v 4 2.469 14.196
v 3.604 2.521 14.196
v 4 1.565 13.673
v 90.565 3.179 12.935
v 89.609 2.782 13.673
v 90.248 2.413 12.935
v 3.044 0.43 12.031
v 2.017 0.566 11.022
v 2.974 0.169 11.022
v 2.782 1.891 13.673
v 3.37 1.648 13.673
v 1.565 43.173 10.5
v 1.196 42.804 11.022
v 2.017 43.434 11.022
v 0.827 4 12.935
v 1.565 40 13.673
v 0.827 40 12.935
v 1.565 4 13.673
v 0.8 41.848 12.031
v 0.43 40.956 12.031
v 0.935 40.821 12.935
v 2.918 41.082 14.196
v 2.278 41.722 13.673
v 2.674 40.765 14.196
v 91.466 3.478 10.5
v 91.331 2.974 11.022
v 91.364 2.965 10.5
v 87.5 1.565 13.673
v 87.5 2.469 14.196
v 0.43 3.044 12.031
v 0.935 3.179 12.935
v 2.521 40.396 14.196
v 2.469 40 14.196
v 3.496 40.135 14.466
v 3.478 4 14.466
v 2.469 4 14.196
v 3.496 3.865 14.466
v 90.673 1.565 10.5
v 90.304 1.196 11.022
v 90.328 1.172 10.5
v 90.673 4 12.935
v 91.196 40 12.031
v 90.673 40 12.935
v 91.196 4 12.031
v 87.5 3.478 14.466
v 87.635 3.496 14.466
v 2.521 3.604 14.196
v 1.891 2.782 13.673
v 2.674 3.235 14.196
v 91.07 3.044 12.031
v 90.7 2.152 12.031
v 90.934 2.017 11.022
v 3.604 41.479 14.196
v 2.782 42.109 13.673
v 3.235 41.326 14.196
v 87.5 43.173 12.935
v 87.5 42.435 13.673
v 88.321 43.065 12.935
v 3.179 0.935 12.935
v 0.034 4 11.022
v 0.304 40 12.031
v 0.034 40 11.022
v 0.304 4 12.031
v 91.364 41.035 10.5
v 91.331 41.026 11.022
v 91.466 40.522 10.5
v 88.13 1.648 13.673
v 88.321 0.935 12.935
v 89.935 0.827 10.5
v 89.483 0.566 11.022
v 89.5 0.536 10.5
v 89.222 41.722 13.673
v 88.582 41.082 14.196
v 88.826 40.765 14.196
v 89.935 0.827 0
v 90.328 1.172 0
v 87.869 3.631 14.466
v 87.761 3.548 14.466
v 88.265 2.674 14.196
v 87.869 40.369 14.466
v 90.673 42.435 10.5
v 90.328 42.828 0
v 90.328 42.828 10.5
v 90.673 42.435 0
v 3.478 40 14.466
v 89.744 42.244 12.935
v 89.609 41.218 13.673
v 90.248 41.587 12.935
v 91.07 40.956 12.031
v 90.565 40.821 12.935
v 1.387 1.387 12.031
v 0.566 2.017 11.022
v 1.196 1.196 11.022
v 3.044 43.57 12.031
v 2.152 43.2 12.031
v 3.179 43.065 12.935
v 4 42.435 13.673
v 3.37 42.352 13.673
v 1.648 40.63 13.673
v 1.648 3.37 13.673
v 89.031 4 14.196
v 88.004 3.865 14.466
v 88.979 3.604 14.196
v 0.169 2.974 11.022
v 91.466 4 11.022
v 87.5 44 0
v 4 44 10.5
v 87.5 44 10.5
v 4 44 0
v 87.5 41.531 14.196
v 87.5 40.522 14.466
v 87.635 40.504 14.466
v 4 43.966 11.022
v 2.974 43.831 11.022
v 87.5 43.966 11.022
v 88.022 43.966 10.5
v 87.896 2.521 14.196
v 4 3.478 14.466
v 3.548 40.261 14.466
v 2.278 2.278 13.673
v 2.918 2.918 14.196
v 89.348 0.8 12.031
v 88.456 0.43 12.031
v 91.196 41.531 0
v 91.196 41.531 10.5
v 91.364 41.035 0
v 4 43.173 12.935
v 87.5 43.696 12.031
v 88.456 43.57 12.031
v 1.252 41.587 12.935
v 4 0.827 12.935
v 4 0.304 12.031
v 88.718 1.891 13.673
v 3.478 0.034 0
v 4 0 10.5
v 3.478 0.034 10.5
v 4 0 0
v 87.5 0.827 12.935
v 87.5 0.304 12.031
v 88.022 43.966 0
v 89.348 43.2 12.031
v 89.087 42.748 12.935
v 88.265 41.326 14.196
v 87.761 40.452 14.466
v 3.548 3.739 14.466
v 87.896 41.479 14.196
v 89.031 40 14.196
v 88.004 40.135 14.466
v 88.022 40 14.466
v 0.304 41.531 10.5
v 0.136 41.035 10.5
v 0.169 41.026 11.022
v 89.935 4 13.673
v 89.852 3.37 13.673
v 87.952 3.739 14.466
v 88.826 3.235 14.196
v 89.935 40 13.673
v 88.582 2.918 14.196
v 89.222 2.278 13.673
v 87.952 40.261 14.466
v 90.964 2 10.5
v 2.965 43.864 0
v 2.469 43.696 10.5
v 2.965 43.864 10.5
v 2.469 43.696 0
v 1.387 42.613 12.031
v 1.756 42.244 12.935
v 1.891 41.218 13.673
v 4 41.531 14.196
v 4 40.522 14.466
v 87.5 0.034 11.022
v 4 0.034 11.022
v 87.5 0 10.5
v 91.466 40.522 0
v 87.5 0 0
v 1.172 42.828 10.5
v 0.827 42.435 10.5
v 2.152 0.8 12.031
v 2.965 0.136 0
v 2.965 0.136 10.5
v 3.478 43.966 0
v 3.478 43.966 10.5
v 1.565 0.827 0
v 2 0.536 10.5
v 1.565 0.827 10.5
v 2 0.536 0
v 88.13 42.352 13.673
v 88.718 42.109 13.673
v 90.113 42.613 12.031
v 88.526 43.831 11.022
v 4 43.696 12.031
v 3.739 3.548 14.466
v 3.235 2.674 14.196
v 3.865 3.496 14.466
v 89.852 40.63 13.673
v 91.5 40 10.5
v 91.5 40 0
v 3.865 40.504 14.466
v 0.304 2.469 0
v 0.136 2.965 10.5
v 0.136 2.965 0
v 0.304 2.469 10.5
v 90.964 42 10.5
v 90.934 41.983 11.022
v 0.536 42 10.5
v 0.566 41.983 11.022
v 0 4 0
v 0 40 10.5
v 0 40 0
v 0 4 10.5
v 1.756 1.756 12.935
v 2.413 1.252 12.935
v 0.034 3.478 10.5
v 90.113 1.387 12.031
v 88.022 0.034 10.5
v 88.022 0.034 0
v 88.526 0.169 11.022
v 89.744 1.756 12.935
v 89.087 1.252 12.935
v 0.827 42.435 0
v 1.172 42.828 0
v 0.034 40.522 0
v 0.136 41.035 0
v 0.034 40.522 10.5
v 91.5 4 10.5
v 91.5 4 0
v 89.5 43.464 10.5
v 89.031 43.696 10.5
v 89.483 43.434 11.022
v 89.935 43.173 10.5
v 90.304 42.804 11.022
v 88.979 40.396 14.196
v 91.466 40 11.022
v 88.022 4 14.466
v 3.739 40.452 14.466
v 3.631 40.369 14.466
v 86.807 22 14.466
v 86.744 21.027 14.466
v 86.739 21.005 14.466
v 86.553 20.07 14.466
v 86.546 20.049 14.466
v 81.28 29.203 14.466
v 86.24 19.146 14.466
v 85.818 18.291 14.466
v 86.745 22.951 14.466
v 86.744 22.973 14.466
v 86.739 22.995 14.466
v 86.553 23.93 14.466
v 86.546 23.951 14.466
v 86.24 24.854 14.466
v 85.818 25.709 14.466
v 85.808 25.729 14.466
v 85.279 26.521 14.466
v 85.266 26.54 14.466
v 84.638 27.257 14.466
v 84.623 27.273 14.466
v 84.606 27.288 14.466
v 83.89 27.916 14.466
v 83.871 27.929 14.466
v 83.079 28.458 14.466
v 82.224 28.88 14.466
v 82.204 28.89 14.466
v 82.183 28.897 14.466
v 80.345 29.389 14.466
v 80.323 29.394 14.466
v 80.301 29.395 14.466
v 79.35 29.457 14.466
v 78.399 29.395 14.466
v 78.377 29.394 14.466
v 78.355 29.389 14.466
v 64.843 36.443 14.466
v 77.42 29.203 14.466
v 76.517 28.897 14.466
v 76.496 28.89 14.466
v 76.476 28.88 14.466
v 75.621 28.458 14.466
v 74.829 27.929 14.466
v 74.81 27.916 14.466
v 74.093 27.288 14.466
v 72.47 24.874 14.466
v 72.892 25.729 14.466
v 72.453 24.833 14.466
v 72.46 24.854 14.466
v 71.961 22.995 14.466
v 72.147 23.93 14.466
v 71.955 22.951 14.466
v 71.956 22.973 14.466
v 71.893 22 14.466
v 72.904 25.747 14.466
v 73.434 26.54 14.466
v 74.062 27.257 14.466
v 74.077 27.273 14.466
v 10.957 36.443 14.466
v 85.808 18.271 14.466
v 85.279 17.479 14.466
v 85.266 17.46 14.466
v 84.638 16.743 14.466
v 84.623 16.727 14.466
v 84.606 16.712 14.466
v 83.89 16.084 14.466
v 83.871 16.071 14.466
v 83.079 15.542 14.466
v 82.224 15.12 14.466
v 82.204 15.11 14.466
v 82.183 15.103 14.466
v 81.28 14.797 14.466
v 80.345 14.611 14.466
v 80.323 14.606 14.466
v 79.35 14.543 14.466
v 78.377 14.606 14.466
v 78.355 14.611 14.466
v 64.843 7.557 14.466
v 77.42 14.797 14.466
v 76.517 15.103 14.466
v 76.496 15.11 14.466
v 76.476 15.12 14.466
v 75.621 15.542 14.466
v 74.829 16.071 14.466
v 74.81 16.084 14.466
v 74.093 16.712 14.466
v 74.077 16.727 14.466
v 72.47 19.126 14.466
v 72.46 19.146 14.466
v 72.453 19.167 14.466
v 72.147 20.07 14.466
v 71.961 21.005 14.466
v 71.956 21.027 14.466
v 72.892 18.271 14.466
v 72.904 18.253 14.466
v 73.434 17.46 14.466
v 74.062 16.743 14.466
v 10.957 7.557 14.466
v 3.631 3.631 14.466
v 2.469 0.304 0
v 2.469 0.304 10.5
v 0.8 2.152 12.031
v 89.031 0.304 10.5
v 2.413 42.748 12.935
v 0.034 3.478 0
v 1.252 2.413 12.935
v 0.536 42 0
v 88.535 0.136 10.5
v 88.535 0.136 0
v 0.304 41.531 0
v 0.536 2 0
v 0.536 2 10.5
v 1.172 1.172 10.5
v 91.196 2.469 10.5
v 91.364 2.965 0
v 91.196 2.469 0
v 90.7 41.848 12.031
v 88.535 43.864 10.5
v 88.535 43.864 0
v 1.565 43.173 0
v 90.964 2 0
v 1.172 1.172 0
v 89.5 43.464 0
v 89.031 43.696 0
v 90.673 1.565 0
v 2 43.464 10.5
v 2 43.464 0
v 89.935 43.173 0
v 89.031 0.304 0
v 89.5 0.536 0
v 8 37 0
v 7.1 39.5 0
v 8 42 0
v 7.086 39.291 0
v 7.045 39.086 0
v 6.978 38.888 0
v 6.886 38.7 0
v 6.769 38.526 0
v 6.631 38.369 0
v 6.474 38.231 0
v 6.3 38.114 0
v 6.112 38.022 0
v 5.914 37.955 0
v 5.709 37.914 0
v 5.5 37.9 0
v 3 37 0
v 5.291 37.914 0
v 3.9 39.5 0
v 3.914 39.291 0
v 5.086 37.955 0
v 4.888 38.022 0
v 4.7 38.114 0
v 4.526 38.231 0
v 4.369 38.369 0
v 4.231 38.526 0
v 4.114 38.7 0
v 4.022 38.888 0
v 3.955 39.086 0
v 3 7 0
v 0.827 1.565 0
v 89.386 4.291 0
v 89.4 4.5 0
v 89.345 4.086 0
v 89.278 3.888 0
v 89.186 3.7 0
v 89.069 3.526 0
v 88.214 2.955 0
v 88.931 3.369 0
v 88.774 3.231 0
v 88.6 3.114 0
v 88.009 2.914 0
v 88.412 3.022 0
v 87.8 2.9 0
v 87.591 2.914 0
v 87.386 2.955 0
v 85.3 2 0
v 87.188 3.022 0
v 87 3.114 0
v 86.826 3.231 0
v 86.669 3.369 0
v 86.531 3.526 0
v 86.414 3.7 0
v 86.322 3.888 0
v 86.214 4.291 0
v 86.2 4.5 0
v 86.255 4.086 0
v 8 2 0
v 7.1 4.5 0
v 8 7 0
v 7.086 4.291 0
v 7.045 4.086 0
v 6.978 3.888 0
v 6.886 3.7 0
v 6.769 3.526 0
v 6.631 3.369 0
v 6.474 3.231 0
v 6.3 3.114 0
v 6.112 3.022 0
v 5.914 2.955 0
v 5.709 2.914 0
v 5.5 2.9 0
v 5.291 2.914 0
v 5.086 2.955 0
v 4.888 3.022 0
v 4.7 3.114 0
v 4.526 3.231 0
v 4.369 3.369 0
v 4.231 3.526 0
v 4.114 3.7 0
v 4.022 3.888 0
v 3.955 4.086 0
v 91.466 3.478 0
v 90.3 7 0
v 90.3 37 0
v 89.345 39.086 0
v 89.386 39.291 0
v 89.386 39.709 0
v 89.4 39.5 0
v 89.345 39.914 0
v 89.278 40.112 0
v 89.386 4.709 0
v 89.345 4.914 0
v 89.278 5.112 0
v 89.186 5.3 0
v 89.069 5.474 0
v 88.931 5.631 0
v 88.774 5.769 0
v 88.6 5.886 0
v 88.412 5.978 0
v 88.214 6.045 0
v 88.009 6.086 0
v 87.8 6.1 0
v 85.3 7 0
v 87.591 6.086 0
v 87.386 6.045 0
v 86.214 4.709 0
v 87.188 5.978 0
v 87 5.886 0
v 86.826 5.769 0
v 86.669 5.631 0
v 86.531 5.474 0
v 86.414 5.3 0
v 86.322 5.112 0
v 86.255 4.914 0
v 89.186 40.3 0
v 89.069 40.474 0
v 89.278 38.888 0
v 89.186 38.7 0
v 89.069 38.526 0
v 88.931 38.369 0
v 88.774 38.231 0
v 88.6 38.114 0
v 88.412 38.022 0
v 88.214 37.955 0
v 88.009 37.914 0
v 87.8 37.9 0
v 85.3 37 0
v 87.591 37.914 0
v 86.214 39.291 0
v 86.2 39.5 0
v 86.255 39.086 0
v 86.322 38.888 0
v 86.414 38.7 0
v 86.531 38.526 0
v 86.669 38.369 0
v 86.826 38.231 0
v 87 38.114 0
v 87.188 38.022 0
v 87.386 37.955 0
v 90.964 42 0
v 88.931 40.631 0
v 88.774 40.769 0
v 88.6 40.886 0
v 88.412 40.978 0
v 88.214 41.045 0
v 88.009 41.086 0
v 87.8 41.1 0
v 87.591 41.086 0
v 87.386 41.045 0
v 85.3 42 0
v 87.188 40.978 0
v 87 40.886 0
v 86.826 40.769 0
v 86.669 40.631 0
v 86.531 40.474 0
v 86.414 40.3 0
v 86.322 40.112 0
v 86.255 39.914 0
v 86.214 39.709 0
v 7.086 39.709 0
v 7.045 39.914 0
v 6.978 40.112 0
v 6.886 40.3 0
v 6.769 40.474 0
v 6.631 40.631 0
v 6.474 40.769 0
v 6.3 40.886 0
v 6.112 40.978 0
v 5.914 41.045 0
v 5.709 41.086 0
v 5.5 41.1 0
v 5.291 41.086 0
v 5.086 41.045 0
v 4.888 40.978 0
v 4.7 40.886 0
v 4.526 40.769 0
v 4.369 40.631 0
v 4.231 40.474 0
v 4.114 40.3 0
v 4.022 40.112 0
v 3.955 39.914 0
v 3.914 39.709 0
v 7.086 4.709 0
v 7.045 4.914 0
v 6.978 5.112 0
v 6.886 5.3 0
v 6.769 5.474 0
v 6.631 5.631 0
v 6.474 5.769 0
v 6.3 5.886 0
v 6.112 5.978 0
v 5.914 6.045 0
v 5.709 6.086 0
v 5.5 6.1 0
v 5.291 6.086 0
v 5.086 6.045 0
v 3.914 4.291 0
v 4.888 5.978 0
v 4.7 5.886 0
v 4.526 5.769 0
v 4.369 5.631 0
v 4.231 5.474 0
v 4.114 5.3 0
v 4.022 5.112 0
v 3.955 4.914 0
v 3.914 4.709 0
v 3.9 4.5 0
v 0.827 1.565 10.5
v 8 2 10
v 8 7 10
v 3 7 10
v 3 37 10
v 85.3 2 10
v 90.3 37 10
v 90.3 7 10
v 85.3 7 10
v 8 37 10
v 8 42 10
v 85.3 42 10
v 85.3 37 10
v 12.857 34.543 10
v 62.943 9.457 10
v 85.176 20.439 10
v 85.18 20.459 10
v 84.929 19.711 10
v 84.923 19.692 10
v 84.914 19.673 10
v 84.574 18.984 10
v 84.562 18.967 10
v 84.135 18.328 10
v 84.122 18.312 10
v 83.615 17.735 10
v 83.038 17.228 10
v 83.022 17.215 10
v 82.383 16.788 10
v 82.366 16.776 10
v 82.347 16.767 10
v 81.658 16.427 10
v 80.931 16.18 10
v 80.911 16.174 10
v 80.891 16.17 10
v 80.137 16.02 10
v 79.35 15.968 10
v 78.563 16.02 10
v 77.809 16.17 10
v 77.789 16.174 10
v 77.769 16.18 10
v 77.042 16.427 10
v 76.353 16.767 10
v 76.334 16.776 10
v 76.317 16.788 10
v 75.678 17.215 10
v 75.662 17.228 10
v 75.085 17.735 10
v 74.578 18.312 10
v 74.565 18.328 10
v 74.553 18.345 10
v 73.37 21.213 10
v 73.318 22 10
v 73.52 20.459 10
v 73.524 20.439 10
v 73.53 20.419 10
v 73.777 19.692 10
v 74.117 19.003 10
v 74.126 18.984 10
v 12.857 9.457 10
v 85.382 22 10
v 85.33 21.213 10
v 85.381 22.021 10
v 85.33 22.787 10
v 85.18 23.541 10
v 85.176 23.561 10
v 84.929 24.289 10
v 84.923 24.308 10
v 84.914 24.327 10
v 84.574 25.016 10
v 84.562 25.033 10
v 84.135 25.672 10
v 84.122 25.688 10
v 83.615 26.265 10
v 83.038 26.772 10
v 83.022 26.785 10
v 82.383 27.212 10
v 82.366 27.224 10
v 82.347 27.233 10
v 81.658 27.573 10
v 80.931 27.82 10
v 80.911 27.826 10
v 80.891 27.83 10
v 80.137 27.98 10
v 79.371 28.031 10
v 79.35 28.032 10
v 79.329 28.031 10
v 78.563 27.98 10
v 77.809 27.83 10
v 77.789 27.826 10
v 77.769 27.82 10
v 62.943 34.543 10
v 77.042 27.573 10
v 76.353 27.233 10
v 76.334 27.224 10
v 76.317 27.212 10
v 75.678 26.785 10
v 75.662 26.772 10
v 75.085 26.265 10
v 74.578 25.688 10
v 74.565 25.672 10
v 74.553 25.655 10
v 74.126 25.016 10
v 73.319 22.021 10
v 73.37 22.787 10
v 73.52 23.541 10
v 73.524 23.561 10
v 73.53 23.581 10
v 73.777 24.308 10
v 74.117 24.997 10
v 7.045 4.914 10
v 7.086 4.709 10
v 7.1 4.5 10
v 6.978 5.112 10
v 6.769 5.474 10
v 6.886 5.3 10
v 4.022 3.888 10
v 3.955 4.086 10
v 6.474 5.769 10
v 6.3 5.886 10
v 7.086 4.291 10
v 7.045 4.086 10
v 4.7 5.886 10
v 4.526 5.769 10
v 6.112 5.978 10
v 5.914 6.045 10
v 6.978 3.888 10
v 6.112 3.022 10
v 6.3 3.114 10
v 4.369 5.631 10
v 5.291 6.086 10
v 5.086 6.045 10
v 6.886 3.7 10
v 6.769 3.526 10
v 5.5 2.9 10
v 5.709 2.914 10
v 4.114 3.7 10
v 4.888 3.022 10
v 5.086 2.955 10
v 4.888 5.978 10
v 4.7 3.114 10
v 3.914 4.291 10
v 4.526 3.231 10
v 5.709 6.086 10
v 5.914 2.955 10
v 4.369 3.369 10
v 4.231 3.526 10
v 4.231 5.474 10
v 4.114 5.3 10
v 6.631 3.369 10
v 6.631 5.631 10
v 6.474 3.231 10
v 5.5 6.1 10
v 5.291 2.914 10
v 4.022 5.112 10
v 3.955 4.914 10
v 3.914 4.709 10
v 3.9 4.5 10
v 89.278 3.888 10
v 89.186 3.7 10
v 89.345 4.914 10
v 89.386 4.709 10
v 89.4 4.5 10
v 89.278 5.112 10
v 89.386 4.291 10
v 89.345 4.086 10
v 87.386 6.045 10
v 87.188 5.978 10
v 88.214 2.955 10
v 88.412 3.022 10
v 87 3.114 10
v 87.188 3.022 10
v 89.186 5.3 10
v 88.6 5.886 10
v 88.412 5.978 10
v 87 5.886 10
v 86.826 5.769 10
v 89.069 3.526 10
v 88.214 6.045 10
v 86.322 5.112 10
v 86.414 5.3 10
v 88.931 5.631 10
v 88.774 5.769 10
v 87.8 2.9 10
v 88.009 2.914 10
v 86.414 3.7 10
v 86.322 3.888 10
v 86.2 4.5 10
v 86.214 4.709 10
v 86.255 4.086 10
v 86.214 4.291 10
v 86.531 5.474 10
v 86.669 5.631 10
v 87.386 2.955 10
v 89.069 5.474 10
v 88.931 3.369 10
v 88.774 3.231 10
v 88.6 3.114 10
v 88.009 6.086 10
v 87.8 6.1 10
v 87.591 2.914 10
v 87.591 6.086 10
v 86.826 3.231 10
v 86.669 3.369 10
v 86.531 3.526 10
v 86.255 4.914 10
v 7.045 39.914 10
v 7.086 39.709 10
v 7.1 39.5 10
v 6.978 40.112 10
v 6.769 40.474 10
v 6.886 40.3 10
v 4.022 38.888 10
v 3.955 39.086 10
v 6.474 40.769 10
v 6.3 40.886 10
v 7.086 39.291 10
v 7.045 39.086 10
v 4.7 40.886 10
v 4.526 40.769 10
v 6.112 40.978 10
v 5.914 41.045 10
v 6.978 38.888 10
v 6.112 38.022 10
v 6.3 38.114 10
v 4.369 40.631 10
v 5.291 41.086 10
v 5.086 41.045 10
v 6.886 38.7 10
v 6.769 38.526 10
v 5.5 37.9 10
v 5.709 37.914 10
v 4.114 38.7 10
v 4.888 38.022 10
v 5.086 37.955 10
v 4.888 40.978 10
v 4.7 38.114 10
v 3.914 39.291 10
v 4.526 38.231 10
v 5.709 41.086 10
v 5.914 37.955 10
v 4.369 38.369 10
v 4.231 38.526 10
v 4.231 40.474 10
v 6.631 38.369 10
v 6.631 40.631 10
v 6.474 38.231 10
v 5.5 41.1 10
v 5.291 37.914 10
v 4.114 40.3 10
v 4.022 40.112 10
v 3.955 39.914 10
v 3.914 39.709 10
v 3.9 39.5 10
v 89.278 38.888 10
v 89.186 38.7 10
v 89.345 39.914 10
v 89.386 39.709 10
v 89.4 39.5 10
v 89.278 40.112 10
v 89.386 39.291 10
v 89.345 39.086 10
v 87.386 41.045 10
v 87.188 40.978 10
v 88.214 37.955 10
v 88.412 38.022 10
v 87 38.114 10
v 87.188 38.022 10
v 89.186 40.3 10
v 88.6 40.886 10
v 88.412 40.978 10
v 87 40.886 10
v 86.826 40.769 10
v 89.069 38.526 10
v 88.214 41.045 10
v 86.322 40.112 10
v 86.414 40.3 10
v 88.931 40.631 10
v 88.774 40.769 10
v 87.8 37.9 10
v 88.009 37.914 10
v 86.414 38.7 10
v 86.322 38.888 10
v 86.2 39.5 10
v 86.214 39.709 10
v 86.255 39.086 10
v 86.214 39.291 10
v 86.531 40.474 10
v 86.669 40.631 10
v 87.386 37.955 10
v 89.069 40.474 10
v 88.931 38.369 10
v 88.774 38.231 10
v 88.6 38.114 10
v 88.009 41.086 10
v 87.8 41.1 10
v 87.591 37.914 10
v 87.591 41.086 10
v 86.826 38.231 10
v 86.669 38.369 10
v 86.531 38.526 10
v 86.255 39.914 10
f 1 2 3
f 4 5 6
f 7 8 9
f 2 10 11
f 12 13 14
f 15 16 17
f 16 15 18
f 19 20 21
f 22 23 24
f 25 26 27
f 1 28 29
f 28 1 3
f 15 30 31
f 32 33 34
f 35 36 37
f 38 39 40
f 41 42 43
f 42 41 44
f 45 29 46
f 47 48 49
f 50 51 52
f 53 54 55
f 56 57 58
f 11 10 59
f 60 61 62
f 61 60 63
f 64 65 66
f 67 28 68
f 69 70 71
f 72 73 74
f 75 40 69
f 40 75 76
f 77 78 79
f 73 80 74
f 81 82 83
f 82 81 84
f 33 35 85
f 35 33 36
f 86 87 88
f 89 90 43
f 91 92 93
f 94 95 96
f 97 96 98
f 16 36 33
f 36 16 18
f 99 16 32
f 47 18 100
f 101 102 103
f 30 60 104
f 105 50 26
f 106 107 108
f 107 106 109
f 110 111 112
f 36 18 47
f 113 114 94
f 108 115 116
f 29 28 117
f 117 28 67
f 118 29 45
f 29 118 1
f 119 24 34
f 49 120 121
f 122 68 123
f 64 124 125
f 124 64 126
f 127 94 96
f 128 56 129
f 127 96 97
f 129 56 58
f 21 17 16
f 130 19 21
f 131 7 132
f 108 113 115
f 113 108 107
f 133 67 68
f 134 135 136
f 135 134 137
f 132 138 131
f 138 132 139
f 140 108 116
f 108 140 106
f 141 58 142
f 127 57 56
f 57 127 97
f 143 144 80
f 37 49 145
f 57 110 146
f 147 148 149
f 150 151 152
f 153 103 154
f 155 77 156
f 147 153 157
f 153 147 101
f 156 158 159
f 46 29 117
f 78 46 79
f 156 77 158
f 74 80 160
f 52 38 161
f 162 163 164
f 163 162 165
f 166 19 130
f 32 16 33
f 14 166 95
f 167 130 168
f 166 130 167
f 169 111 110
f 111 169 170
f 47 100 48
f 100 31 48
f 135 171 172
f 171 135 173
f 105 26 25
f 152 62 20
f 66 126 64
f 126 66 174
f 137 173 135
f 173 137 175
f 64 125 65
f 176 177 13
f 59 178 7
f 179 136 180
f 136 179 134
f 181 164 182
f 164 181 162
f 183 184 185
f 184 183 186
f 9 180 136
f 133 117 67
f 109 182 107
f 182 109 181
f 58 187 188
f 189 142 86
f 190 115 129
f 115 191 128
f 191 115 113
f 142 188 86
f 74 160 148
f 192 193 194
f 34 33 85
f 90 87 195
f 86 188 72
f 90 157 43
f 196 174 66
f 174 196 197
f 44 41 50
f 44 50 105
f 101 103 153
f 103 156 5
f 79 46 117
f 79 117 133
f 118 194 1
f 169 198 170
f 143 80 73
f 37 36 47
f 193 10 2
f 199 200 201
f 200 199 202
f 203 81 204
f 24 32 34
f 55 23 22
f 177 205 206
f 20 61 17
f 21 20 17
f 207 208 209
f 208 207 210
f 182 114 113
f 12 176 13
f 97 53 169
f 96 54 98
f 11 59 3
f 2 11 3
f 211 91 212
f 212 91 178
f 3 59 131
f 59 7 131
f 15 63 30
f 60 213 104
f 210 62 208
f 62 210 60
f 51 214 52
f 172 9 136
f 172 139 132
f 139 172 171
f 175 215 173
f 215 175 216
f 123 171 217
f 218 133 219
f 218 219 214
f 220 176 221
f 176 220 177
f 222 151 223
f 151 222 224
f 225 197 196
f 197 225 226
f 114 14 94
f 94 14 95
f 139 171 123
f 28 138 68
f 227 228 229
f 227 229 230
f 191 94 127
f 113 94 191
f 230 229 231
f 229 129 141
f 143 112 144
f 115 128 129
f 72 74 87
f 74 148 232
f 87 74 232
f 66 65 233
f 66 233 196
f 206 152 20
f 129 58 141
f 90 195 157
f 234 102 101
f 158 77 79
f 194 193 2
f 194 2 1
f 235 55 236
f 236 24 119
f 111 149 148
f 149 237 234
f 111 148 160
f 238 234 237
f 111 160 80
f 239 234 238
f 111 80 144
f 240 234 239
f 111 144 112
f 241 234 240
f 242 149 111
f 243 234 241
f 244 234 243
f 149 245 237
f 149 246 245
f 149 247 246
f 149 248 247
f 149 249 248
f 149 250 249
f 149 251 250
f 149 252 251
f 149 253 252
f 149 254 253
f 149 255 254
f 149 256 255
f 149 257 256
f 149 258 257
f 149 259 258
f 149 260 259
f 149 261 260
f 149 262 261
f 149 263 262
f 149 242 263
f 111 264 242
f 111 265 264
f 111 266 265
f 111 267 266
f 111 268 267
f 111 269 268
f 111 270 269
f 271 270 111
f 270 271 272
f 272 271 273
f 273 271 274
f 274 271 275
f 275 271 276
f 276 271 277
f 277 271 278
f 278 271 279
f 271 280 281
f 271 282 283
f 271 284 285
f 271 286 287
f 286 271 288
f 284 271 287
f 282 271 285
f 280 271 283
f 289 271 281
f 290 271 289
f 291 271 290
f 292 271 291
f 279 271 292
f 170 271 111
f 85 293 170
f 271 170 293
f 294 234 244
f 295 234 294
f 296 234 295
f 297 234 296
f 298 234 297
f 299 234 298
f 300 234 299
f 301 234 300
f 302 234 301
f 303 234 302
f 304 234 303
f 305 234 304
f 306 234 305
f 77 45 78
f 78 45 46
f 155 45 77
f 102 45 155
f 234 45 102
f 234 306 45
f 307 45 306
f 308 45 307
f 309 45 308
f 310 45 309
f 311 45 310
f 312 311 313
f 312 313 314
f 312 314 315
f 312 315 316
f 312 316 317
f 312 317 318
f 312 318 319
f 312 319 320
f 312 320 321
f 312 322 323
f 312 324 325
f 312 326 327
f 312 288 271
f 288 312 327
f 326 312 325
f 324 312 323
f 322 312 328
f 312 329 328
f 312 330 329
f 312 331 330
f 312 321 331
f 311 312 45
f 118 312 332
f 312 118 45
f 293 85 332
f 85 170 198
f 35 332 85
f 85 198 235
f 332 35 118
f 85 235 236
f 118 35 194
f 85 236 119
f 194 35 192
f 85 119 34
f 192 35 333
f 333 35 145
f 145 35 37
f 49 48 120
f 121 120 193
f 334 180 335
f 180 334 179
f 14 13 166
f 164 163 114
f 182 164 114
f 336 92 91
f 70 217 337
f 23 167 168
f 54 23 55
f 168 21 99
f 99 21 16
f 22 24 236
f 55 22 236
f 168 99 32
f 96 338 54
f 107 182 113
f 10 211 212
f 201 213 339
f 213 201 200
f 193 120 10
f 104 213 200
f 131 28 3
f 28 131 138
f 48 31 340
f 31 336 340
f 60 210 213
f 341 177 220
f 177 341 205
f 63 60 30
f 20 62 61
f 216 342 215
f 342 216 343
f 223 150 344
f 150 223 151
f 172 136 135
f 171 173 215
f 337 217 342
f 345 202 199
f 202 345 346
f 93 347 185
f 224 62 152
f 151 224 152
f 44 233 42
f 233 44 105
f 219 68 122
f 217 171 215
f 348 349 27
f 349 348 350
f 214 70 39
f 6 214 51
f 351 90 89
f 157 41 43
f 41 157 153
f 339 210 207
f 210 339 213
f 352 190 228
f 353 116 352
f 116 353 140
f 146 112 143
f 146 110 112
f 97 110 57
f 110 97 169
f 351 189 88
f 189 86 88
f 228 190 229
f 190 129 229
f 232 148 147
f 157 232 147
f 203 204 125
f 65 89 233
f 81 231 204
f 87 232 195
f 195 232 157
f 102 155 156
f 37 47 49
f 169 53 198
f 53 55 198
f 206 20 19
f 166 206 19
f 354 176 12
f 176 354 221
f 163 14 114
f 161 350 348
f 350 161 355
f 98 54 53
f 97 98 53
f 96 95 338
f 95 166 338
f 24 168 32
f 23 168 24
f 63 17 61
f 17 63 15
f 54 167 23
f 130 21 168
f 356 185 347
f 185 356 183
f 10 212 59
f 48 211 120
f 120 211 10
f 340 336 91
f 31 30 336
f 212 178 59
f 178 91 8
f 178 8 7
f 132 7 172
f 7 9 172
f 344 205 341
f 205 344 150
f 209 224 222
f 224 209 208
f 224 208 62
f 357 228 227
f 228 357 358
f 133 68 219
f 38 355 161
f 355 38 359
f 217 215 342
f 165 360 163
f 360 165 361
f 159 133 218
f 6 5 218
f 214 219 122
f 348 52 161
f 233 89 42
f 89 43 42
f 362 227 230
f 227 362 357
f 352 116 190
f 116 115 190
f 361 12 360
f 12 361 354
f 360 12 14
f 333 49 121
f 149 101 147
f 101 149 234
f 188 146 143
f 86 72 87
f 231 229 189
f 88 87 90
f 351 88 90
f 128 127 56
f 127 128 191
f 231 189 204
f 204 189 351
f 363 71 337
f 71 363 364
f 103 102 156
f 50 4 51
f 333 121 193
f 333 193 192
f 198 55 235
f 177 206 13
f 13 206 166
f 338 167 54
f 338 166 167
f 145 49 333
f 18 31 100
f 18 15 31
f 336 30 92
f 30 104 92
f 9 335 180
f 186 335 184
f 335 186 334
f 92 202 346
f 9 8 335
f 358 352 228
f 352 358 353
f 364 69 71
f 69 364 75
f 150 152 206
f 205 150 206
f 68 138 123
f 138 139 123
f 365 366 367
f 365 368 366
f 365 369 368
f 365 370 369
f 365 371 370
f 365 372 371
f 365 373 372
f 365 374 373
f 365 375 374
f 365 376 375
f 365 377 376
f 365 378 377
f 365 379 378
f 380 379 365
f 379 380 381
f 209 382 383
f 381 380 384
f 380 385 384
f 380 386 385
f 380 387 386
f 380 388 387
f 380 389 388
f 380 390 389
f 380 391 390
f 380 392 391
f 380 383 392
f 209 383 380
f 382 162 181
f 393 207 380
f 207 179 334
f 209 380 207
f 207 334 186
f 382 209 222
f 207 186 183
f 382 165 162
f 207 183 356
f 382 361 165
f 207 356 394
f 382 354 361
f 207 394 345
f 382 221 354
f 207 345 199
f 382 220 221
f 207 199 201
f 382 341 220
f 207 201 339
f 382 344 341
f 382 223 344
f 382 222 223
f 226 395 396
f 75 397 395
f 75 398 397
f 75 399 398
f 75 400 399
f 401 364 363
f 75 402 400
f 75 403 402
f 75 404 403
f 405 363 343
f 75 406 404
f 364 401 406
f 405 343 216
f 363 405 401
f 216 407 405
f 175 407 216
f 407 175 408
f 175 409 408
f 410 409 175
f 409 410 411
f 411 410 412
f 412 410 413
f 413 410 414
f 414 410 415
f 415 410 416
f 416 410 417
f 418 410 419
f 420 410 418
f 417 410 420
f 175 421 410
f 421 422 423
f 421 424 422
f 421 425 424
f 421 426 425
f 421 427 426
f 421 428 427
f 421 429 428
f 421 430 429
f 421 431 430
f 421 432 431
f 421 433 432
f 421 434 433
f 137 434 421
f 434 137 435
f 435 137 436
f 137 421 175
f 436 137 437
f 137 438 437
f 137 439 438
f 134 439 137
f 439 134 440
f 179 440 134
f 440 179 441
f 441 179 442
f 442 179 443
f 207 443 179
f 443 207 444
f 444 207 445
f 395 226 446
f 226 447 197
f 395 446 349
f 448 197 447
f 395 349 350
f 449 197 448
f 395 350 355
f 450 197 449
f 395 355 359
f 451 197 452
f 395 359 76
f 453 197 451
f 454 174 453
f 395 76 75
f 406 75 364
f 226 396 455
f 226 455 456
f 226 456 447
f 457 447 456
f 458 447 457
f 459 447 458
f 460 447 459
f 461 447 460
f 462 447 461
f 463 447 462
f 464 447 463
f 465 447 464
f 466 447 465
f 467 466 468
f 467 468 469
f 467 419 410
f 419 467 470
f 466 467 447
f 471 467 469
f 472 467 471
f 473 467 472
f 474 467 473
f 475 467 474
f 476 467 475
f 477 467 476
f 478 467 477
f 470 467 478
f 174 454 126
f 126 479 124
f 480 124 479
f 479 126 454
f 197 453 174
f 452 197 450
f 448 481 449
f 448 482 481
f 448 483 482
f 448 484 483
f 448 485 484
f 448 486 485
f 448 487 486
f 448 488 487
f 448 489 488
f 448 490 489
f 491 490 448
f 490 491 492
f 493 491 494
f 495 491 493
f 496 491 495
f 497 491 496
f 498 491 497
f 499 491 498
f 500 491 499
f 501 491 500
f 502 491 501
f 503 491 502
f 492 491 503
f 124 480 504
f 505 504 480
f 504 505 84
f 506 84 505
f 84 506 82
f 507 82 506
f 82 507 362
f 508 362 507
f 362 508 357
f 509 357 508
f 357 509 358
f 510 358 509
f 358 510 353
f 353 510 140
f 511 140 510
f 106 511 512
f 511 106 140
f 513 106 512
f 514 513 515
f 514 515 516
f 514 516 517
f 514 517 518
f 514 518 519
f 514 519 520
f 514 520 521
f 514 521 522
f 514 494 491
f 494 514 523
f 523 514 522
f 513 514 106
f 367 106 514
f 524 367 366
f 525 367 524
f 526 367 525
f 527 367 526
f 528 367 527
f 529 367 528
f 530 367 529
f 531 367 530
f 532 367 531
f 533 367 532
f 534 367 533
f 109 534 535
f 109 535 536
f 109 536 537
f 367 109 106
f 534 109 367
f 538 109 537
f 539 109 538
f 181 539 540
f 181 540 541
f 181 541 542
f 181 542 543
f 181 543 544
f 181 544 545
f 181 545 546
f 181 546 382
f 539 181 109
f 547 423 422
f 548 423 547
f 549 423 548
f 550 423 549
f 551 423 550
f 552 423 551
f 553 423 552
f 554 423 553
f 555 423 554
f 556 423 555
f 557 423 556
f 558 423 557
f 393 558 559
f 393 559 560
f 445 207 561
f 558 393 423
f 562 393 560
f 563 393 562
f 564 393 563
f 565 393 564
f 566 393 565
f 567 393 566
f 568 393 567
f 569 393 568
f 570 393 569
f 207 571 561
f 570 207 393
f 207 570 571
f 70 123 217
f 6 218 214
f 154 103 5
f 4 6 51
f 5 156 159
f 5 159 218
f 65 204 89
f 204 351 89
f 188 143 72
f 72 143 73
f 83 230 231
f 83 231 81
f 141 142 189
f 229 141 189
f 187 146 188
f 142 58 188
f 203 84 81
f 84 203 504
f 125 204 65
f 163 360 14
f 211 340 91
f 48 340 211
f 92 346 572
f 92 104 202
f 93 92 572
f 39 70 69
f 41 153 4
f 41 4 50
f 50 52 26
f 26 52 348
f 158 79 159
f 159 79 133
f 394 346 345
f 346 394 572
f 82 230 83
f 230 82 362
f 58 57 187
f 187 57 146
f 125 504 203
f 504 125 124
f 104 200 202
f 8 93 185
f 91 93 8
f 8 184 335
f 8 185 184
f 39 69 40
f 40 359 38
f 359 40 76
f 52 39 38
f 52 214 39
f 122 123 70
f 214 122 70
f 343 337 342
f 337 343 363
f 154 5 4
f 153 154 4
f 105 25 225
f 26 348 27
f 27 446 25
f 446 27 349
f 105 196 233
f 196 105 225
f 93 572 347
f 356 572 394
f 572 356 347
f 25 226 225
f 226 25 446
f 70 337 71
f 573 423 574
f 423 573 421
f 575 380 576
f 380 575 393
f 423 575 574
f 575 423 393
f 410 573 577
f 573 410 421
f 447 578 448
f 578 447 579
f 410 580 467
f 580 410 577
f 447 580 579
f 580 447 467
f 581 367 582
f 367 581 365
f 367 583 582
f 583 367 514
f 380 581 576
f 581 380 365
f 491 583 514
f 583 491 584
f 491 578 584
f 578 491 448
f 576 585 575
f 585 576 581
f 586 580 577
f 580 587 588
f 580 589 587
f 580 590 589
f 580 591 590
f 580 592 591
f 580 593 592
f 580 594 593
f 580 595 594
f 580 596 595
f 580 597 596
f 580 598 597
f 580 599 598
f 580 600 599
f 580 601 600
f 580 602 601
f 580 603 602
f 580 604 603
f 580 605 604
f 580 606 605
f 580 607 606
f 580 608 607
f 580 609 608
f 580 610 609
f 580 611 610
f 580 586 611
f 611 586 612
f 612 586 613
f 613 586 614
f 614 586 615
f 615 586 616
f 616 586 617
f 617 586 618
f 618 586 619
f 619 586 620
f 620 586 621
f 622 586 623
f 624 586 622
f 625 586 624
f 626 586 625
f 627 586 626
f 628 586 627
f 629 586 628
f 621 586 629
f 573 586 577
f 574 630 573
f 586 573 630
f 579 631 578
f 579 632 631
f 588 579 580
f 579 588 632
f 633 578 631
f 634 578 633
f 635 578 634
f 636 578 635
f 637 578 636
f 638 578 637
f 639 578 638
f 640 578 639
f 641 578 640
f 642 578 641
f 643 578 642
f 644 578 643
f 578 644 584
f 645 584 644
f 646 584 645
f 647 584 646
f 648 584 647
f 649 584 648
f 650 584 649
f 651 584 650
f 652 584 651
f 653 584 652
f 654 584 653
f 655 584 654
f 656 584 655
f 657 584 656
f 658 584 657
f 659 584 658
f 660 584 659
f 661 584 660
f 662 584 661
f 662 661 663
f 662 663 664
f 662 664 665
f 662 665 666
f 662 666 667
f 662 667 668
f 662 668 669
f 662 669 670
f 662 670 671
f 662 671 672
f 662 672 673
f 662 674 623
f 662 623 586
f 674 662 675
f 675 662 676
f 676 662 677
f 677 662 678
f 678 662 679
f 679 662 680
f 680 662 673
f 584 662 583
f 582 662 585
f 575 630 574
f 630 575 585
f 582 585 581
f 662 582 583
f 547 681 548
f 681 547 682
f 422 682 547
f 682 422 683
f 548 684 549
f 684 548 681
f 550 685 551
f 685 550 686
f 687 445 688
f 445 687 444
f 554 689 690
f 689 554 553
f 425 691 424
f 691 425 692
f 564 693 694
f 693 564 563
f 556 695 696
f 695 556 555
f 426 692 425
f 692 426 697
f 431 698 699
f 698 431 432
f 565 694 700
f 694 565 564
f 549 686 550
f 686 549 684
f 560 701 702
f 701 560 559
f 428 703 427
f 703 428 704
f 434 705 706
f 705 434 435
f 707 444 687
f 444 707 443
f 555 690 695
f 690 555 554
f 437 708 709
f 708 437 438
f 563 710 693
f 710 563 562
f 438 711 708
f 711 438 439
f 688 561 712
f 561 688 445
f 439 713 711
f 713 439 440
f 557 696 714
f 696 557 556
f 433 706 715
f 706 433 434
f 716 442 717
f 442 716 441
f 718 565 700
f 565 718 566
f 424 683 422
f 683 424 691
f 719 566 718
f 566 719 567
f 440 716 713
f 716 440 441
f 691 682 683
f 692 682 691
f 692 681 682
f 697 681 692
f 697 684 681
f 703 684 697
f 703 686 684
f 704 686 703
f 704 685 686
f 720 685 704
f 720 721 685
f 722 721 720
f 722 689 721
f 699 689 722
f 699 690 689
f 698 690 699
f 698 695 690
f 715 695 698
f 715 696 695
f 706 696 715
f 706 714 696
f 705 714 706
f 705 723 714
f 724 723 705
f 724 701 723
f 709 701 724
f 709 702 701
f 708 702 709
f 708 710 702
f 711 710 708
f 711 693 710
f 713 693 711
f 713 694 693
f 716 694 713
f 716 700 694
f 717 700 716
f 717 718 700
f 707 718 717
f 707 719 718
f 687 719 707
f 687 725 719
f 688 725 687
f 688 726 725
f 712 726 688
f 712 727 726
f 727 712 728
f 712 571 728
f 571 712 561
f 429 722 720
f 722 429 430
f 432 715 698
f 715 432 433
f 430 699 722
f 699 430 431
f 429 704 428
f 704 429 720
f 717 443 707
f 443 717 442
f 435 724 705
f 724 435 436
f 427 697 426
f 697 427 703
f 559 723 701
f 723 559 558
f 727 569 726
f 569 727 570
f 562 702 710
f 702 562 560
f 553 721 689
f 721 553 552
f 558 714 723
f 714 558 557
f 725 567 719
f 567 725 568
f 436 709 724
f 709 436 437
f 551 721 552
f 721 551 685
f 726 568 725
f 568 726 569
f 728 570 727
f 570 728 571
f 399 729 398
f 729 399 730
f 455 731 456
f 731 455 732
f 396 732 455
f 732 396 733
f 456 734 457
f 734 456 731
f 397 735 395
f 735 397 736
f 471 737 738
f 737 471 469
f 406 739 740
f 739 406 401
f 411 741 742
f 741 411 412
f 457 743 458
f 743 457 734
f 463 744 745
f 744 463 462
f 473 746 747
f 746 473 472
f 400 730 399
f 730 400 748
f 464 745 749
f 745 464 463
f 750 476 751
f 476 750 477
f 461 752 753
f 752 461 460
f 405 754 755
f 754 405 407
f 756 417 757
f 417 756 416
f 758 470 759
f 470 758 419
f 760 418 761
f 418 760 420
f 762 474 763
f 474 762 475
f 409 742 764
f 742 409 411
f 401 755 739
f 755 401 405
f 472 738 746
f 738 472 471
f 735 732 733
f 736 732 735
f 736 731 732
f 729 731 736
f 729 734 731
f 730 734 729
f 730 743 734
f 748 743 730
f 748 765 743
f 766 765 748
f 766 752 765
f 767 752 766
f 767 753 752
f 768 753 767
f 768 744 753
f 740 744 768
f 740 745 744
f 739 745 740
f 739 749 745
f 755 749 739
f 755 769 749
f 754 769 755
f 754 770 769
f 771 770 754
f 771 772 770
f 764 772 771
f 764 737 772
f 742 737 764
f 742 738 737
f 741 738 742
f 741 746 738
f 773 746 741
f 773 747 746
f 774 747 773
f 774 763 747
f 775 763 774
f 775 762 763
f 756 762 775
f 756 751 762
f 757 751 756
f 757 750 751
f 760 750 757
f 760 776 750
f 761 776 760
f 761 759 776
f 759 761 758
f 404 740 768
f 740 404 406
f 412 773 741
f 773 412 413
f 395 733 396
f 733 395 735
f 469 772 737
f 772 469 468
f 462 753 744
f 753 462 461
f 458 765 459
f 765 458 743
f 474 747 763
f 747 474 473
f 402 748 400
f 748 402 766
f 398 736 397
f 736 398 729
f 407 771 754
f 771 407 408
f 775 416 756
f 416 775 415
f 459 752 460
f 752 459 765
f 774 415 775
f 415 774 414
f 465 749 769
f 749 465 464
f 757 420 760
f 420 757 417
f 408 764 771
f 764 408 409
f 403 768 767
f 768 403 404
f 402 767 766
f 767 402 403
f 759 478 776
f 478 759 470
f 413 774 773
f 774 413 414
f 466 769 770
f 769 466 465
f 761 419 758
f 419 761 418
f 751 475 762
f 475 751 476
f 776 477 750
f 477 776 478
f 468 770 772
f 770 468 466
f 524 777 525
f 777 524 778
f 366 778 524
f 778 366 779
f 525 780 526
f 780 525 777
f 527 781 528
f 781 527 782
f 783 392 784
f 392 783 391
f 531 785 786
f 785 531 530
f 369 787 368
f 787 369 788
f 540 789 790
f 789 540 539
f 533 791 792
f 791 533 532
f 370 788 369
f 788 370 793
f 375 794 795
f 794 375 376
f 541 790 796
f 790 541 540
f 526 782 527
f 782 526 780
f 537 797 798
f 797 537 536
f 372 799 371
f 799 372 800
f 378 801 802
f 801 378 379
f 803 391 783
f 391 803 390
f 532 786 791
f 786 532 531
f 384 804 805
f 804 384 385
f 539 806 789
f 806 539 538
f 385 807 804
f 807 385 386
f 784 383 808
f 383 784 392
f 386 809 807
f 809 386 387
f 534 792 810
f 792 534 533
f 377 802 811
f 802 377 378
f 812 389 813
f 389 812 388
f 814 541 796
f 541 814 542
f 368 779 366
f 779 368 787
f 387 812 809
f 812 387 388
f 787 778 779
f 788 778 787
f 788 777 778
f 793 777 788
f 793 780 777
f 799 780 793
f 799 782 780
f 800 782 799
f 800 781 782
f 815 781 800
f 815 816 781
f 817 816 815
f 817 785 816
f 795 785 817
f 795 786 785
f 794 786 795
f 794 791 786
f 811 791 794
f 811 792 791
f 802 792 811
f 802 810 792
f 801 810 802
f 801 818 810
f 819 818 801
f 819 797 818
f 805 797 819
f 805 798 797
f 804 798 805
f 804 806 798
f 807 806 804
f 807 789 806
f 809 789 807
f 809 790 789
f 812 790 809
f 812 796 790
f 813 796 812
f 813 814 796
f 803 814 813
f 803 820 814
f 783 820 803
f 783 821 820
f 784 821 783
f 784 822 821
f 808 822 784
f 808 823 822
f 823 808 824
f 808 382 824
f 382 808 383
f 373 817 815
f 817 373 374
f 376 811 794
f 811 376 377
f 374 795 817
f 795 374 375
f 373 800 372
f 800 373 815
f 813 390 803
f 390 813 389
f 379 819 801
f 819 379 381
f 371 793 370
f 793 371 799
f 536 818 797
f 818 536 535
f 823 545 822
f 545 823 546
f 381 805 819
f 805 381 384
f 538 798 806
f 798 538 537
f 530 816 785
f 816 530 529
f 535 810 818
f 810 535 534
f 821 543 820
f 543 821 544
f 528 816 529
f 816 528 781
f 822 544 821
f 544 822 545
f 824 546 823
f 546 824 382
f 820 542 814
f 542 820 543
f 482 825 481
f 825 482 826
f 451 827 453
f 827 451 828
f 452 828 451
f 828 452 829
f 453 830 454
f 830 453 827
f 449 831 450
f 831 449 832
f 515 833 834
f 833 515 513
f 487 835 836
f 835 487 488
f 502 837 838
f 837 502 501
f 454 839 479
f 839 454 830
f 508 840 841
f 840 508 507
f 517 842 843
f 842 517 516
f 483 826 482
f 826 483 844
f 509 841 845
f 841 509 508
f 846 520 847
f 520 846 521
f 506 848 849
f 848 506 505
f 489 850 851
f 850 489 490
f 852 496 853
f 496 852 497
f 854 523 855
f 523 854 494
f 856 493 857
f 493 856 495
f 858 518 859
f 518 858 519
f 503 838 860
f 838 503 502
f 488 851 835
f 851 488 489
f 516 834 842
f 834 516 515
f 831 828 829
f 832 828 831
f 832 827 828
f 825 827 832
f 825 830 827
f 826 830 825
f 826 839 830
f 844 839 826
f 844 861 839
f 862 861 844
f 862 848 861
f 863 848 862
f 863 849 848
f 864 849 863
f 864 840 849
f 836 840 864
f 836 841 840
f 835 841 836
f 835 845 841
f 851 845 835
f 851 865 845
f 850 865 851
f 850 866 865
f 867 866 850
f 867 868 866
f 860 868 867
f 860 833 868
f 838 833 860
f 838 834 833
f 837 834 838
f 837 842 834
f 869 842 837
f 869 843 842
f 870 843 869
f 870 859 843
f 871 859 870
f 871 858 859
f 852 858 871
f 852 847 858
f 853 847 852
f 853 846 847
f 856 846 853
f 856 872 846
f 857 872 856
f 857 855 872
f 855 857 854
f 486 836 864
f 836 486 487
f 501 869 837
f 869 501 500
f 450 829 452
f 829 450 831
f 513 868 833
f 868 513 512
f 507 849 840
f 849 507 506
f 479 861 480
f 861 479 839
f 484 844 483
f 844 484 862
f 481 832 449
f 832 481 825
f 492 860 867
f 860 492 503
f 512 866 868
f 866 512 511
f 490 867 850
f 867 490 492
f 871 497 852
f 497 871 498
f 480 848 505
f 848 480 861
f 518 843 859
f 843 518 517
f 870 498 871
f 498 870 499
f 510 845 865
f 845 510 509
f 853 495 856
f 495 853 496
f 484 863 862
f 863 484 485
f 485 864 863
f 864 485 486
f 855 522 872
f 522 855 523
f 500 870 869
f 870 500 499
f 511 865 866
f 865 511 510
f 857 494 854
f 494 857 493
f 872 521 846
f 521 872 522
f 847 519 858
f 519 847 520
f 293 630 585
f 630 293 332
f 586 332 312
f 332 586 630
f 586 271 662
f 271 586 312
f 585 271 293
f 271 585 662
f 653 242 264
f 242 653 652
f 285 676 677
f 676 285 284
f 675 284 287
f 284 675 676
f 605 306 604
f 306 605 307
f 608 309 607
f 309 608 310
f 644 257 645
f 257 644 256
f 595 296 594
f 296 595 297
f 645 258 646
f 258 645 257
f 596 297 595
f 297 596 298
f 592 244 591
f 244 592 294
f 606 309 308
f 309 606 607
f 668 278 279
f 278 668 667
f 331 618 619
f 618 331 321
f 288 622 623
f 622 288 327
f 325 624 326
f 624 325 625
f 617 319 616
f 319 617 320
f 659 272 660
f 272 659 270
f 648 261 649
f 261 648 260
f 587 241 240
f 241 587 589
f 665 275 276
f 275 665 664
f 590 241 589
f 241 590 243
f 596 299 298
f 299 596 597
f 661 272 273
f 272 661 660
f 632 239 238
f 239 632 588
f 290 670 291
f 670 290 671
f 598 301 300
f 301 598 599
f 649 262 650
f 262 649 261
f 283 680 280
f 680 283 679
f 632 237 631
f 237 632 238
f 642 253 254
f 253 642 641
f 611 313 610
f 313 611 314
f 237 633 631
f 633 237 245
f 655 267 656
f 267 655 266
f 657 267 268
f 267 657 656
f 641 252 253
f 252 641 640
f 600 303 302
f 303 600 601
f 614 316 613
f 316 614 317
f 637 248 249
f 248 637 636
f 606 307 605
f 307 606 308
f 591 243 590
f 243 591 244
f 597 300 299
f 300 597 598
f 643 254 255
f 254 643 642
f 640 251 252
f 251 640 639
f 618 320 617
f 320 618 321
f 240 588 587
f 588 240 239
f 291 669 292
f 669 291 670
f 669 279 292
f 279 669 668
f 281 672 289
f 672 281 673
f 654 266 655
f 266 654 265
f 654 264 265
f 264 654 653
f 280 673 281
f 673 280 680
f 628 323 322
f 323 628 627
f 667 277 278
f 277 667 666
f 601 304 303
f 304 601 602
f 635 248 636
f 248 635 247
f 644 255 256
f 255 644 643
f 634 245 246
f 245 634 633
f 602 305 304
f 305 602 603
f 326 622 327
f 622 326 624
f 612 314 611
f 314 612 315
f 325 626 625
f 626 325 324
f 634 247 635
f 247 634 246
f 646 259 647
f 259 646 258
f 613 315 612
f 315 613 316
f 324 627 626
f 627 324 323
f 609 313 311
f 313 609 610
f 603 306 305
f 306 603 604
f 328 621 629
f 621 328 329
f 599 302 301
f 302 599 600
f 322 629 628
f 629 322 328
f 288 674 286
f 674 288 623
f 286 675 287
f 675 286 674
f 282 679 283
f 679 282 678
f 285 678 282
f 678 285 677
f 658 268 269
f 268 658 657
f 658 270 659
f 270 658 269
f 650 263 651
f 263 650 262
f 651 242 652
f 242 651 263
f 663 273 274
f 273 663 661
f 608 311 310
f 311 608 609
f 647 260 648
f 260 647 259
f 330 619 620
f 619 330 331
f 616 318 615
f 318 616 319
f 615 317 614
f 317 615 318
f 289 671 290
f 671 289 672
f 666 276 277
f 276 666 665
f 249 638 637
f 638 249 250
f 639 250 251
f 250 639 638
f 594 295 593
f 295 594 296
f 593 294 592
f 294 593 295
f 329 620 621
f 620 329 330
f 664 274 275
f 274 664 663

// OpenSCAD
// Dilder Rev 2 "extended with joystick" — TOP COVER (windowed) v1
//
// Curved BULLNOSE top face (pattern from top-cover-v3-rounded-top) with
// a display viewing window and a joystick through-hole cut through the
// face plate + bullnose. No internal retention rails or lips — a
// separate retention plate bolting up through the 4 corner pillars is
// responsible for holding the display.
//
// Outer footprint (91.5 × 44) and corner-pillar XY positions match
// base-v1 and middle-platform-v1 so the M3 through-bolts line up through
// the entire stack. All 4 corner pillars run full-height from the cover
// floor up through the face plate.
//
// Display is offset as far -X as possible (over the battery half, which
// is ALSO the half supported from below by middle-platform-v1's solid
// fill pedestal). A separate through-hole punches the face plate on the
// +X half (center of the remaining right-hand region) — intended for a
// joystick shaft / control input above the ESP32 side.
//
// Export:
//   openscad -o top-cover-windowed-v1.3mf top-cover-windowed-v1.scad

$fn = 48;

// ============================================================
// Outer shell (flush with base-v1 and middle-platform-v1)
// ============================================================
enclosure_outer_width_along_x_axis_mm          = 91.5;
enclosure_outer_depth_along_y_axis_mm          = 44;
outer_case_top_view_corner_radius_mm           = 4;   // matches base
// Bigger bullnose = more pronounced curve across the whole front face
// (see sketch IMG20260422215927.jpg — top edge rolls into the top face).
outer_case_top_edge_bullnose_radius_mm         = 4;   // curved TOP edge

// ============================================================
// Asymmetric ±X end walls — match base-v1 so pillar origins align
// ============================================================
minus_x_end_wall_thickness_mm                  = 3.0; // battery end
plus_x_end_wall_thickness_mm                   = 1.2; // USB-C end (thin)
perimeter_long_side_wall_thickness_y_mm_base   = 2;   // base's ±Y wall

// ============================================================
// Cover Z layout (cover-local: z=0 is the cover's mating bottom,
// flush with the middle-platform shell top at stack z = 22)
// ============================================================
// middle-platform-v1's -X solid fill pedestal pokes 5 mm above its
// 8 mm shell top. In cover-local coords that puts the pedestal top at
// z = 5, which is exactly where the display's underside sits — the
// pedestal supports the display's left half from below, while the
// snap lips catch the right half.
middle_platform_pedestal_protrusion_into_cover_z_mm = 5;

display_footprint_thickness_z_mm               = 5;   // Waveshare 2.13"
// Thin face plate — tapers further at the window edge via the chamfered
// window cut below, so the face over the screen reads as a thin bezel.
// Most of the visible "top-face taper" now happens inside the bullnose
// region above this plate; the plate itself is minimum-printable thin.
face_plate_thickness_z_mm                      = 0.5;

display_bottom_z_mm =
    middle_platform_pedestal_protrusion_into_cover_z_mm;      // = 5
display_top_z_mm =
    display_bottom_z_mm + display_footprint_thickness_z_mm;   // = 10
face_plate_bottom_z_mm                         = display_top_z_mm; // = 10, flush against display top
face_plate_top_z_mm =
    face_plate_bottom_z_mm + face_plate_thickness_z_mm;       // = 12
cover_total_height_z_mm =
    face_plate_top_z_mm + outer_case_top_edge_bullnose_radius_mm; // = 14

// ============================================================
// Display footprint — Waveshare 2.13", LANDSCAPE in Rev 2
// ============================================================
// Rev 1 had the display in portrait (30 × 65). For Rev 2 the enclosure
// long axis is X (91.5 mm), so the 65 mm side of the display lies along
// X and the 30 mm side along Y.
display_footprint_length_along_x_mm            = 65;
display_footprint_depth_along_y_mm             = 30;
print_fit_tolerance_slop_mm                    = 0.4;

// "Offset the window as far LEFT as possible" — display's -X edge butts
// against the -X inner wall face with just the print-slop gap.
display_minus_x_origin_mm =
    minus_x_end_wall_thickness_mm
      + print_fit_tolerance_slop_mm;                              // = 3.4
display_plus_x_end_mm =
    display_minus_x_origin_mm + display_footprint_length_along_x_mm; // = 68.4
display_y_centerline_mm =
    enclosure_outer_depth_along_y_axis_mm / 2;                    // = 22
display_minus_y_origin_mm =
    display_y_centerline_mm - display_footprint_depth_along_y_mm / 2; // = 7
display_plus_y_end_mm =
    display_minus_y_origin_mm + display_footprint_depth_along_y_mm;   // = 37

// ============================================================
// Display viewing window cut through the face plate + bullnose
// ============================================================
// Scaled from Rev 1's top-plate-windowed-v1 (25 × 50 opening on a
// 30 × 65 display), reoriented for landscape so the long axis of the
// window lies along X.
display_viewing_window_length_along_x_mm       = 50;
display_viewing_window_depth_along_y_mm        = 25;
// Nudge the window +X toward the joystick hole from the display-centered
// position. Asymmetric bezel: more material on the -X (battery) side,
// less on the +X (joystick) side.
display_window_shift_toward_joystick_x_mm      = 2;
display_window_origin_x_mm =
    display_minus_x_origin_mm
      + (display_footprint_length_along_x_mm
          - display_viewing_window_length_along_x_mm) / 2
      + display_window_shift_toward_joystick_x_mm;
display_window_origin_y_mm =
    display_minus_y_origin_mm
      + (display_footprint_depth_along_y_mm
          - display_viewing_window_depth_along_y_mm) / 2;        // centered on display in Y

// Top-of-window taper: the window opening widens from its true
// (display-matched) size at the face-plate bottom to a larger opening at
// the very top of the cover, so the bullnose + face-plate material visibly
// tapers DOWN into the screen edges (a shallow funnel around the window).
display_window_top_taper_width_mm              = 2.0;

// ============================================================
// Joystick through-hole on the +X half of the face plate
// ============================================================
// Centered in the open region between the display's +X end and the +X
// inner wall face, Y-centered on the enclosure axis. Default 12 mm Ø
// is a reasonable starting point for a thumb-joystick shaft with bezel
// clearance — tune to the real joystick module.
joystick_through_hole_diameter_mm              = 12;
joystick_through_hole_center_x_mm =
    (display_plus_x_end_mm
      + (enclosure_outer_width_along_x_axis_mm
          - plus_x_end_wall_thickness_mm)) / 2;
joystick_through_hole_center_y_mm              = display_y_centerline_mm;
// Chamfer on the joystick hole — matches the window taper language.
// The bore is true diameter at the face-plate bottom and widens by
// `joystick_hole_top_taper_width_mm` on radius at the top of the cover,
// so the bullnose rolls smoothly into the joystick opening instead of
// meeting it at a hard square edge.
joystick_hole_top_taper_width_mm               = 1.5;

// ============================================================
// Corner pillars — identical XY to base-v1 / middle-platform-v1
// ============================================================
corner_pillar_square_side_length_mm            = 5;
corner_pillar_inner_facing_corner_radius_mm    = 1;
m3_screw_clearance_hole_diameter_mm            = 3.2;

corner_pillar_xy_origin_positions_list = [
    [minus_x_end_wall_thickness_mm,
     perimeter_long_side_wall_thickness_y_mm_base],
    [enclosure_outer_width_along_x_axis_mm
       - plus_x_end_wall_thickness_mm
       - corner_pillar_square_side_length_mm,
     perimeter_long_side_wall_thickness_y_mm_base],
    [minus_x_end_wall_thickness_mm,
     enclosure_outer_depth_along_y_axis_mm
       - perimeter_long_side_wall_thickness_y_mm_base
       - corner_pillar_square_side_length_mm],
    [enclosure_outer_width_along_x_axis_mm
       - plus_x_end_wall_thickness_mm
       - corner_pillar_square_side_length_mm,
     enclosure_outer_depth_along_y_axis_mm
       - perimeter_long_side_wall_thickness_y_mm_base
       - corner_pillar_square_side_length_mm],
];


// ========== Helpers (shared shape language with base-v1) ==========

module rounded_v_box(w, l, h, r, fn = 48) {
    hull() {
        for (x = [r, w - r])
            for (y = [r, l - r])
                translate([x, y, 0])
                    cylinder(r = r, h = h, $fn = fn);
    }
}

module pillar_one_round(w, l, h, r, round_x, round_y) {
    tiny = 0.01;
    hull() {
        for (ix = [0, 1])
            for (iy = [0, 1]) {
                cr = (ix == round_x && iy == round_y) ? r : tiny;
                translate([cr + ix * (w - 2*cr), cr + iy * (l - 2*cr), 0])
                    cylinder(r = cr, h = h, $fn = 48);
            }
    }
}

// Rounded-rectangle PRISM with a BULLNOSE top edge — the curved top
// face (lifted from top-cover-v3-rounded-top). Top face is clipped flat
// at `h`, and the transition from the vertical walls to the top face is
// a curve with radius ≈ `top_r`.
module shell_with_bullnose_top(w, l, h, case_r, top_r) {
    intersection() {
        hull() {
            for (x = [case_r, w - case_r])
                for (y = [case_r, l - case_r]) {
                    translate([x, y, 0])
                        cylinder(r = case_r, h = h - top_r, $fn = 48);
                    translate([x, y, h - top_r])
                        sphere(r = case_r, $fn = 24);
                }
        }
        translate([-1, -1, 0])
            cube([w + 2, l + 2, h]);
    }
}

// Cavity carve that preserves the 4 corner pillars (so M3 screw holes
// stay fully embedded in solid pillar material).
module chamber_carve_preserving_pillars(origin_x, origin_y, origin_z,
                                        width_x, depth_y, height_z,
                                        pillar_xy_list, pillar_side) {
    difference() {
        translate([origin_x, origin_y, origin_z])
            cube([width_x, depth_y, height_z]);
        for (pillar_origin_xy = pillar_xy_list)
            translate([pillar_origin_xy[0], pillar_origin_xy[1], origin_z - 0.5])
                cube([pillar_side, pillar_side, height_z + 1]);
    }
}


// ========== Top cover (windowed) ==========

module top_cover_windowed() {
    // Cavity extents (below the face plate, full inner footprint).
    cavity_inner_x_start_mm = minus_x_end_wall_thickness_mm;
    cavity_inner_x_end_mm =
        enclosure_outer_width_along_x_axis_mm
          - plus_x_end_wall_thickness_mm;
    cavity_inner_y_start_mm = perimeter_long_side_wall_thickness_y_mm_base;
    cavity_inner_y_end_mm =
        enclosure_outer_depth_along_y_axis_mm
          - perimeter_long_side_wall_thickness_y_mm_base;

    difference() {
        union() {
            shell_with_bullnose_top(
                enclosure_outer_width_along_x_axis_mm,
                enclosure_outer_depth_along_y_axis_mm,
                cover_total_height_z_mm,
                outer_case_top_view_corner_radius_mm,
                outer_case_top_edge_bullnose_radius_mm);

            // Corner pillars — full-height from cover floor up through
            // the face plate so the M3 clearance bore is embedded in
            // solid material top-to-bottom and the face plate ties into
            // every pillar. Only the inward-facing corner is rounded.
            for (corner_pillar_origin_xy = corner_pillar_xy_origin_positions_list) {
                pillar_rounds_positive_x_corner =
                    (corner_pillar_origin_xy[0]
                      < enclosure_outer_width_along_x_axis_mm / 2) ? 1 : 0;
                pillar_rounds_positive_y_corner =
                    (corner_pillar_origin_xy[1]
                      < enclosure_outer_depth_along_y_axis_mm / 2) ? 1 : 0;
                translate([corner_pillar_origin_xy[0],
                           corner_pillar_origin_xy[1],
                           0])
                    pillar_one_round(
                        corner_pillar_square_side_length_mm,
                        corner_pillar_square_side_length_mm,
                        face_plate_top_z_mm,
                        corner_pillar_inner_facing_corner_radius_mm,
                        pillar_rounds_positive_x_corner,
                        pillar_rounds_positive_y_corner);
            }
        }

        // Hollow interior below the face plate, preserving each corner
        // pillar's full-height column so the M3 bore stays in solid
        // material.
        chamber_carve_preserving_pillars(
            cavity_inner_x_start_mm,
            cavity_inner_y_start_mm,
            -0.1,
            cavity_inner_x_end_mm - cavity_inner_x_start_mm,
            cavity_inner_y_end_mm - cavity_inner_y_start_mm,
            face_plate_bottom_z_mm + 0.1,
            corner_pillar_xy_origin_positions_list,
            corner_pillar_square_side_length_mm);

        // Display viewing window — tapered cut. Face-plate-bottom
        // opening matches the true window size; widens by
        // 2·taper at the top of the cover so the face plate + bullnose
        // read as a shallow funnel around the screen edges.
        hull() {
            translate([display_window_origin_x_mm,
                       display_window_origin_y_mm,
                       face_plate_bottom_z_mm - 0.1])
                cube([display_viewing_window_length_along_x_mm,
                      display_viewing_window_depth_along_y_mm,
                      0.001]);
            translate([display_window_origin_x_mm
                         - display_window_top_taper_width_mm,
                       display_window_origin_y_mm
                         - display_window_top_taper_width_mm,
                       cover_total_height_z_mm + 0.1 - 0.001])
                cube([display_viewing_window_length_along_x_mm
                        + 2 * display_window_top_taper_width_mm,
                      display_viewing_window_depth_along_y_mm
                        + 2 * display_window_top_taper_width_mm,
                      0.001]);
        }

        // Joystick through-hole — tapered cut like the display window.
        translate([joystick_through_hole_center_x_mm,
                   joystick_through_hole_center_y_mm,
                   0])
            hull() {
                translate([0, 0, face_plate_bottom_z_mm - 0.1])
                    cylinder(
                        h = 0.001,
                        d = joystick_through_hole_diameter_mm);
                translate([0, 0,
                           cover_total_height_z_mm + 0.1 - 0.001])
                    cylinder(
                        h = 0.001,
                        d = joystick_through_hole_diameter_mm
                              + 2 * joystick_hole_top_taper_width_mm);
            }

        // BLIND M3 bores — open at the cover's mating bottom, capped
        // at face_plate_bottom_z_mm so the face plate + bullnose above
        // hide the bore from the front view.
        for (corner_pillar_origin_xy = corner_pillar_xy_origin_positions_list) {
            screw_hole_center_x_mm =
                corner_pillar_origin_xy[0]
                  + corner_pillar_square_side_length_mm / 2;
            screw_hole_center_y_mm =
                corner_pillar_origin_xy[1]
                  + corner_pillar_square_side_length_mm / 2;
            translate([screw_hole_center_x_mm,
                       screw_hole_center_y_mm,
                       -0.1])
                cylinder(h = face_plate_bottom_z_mm + 0.1,
                         d = m3_screw_clearance_hole_diameter_mm);
        }
    }
}

top_cover_windowed();
